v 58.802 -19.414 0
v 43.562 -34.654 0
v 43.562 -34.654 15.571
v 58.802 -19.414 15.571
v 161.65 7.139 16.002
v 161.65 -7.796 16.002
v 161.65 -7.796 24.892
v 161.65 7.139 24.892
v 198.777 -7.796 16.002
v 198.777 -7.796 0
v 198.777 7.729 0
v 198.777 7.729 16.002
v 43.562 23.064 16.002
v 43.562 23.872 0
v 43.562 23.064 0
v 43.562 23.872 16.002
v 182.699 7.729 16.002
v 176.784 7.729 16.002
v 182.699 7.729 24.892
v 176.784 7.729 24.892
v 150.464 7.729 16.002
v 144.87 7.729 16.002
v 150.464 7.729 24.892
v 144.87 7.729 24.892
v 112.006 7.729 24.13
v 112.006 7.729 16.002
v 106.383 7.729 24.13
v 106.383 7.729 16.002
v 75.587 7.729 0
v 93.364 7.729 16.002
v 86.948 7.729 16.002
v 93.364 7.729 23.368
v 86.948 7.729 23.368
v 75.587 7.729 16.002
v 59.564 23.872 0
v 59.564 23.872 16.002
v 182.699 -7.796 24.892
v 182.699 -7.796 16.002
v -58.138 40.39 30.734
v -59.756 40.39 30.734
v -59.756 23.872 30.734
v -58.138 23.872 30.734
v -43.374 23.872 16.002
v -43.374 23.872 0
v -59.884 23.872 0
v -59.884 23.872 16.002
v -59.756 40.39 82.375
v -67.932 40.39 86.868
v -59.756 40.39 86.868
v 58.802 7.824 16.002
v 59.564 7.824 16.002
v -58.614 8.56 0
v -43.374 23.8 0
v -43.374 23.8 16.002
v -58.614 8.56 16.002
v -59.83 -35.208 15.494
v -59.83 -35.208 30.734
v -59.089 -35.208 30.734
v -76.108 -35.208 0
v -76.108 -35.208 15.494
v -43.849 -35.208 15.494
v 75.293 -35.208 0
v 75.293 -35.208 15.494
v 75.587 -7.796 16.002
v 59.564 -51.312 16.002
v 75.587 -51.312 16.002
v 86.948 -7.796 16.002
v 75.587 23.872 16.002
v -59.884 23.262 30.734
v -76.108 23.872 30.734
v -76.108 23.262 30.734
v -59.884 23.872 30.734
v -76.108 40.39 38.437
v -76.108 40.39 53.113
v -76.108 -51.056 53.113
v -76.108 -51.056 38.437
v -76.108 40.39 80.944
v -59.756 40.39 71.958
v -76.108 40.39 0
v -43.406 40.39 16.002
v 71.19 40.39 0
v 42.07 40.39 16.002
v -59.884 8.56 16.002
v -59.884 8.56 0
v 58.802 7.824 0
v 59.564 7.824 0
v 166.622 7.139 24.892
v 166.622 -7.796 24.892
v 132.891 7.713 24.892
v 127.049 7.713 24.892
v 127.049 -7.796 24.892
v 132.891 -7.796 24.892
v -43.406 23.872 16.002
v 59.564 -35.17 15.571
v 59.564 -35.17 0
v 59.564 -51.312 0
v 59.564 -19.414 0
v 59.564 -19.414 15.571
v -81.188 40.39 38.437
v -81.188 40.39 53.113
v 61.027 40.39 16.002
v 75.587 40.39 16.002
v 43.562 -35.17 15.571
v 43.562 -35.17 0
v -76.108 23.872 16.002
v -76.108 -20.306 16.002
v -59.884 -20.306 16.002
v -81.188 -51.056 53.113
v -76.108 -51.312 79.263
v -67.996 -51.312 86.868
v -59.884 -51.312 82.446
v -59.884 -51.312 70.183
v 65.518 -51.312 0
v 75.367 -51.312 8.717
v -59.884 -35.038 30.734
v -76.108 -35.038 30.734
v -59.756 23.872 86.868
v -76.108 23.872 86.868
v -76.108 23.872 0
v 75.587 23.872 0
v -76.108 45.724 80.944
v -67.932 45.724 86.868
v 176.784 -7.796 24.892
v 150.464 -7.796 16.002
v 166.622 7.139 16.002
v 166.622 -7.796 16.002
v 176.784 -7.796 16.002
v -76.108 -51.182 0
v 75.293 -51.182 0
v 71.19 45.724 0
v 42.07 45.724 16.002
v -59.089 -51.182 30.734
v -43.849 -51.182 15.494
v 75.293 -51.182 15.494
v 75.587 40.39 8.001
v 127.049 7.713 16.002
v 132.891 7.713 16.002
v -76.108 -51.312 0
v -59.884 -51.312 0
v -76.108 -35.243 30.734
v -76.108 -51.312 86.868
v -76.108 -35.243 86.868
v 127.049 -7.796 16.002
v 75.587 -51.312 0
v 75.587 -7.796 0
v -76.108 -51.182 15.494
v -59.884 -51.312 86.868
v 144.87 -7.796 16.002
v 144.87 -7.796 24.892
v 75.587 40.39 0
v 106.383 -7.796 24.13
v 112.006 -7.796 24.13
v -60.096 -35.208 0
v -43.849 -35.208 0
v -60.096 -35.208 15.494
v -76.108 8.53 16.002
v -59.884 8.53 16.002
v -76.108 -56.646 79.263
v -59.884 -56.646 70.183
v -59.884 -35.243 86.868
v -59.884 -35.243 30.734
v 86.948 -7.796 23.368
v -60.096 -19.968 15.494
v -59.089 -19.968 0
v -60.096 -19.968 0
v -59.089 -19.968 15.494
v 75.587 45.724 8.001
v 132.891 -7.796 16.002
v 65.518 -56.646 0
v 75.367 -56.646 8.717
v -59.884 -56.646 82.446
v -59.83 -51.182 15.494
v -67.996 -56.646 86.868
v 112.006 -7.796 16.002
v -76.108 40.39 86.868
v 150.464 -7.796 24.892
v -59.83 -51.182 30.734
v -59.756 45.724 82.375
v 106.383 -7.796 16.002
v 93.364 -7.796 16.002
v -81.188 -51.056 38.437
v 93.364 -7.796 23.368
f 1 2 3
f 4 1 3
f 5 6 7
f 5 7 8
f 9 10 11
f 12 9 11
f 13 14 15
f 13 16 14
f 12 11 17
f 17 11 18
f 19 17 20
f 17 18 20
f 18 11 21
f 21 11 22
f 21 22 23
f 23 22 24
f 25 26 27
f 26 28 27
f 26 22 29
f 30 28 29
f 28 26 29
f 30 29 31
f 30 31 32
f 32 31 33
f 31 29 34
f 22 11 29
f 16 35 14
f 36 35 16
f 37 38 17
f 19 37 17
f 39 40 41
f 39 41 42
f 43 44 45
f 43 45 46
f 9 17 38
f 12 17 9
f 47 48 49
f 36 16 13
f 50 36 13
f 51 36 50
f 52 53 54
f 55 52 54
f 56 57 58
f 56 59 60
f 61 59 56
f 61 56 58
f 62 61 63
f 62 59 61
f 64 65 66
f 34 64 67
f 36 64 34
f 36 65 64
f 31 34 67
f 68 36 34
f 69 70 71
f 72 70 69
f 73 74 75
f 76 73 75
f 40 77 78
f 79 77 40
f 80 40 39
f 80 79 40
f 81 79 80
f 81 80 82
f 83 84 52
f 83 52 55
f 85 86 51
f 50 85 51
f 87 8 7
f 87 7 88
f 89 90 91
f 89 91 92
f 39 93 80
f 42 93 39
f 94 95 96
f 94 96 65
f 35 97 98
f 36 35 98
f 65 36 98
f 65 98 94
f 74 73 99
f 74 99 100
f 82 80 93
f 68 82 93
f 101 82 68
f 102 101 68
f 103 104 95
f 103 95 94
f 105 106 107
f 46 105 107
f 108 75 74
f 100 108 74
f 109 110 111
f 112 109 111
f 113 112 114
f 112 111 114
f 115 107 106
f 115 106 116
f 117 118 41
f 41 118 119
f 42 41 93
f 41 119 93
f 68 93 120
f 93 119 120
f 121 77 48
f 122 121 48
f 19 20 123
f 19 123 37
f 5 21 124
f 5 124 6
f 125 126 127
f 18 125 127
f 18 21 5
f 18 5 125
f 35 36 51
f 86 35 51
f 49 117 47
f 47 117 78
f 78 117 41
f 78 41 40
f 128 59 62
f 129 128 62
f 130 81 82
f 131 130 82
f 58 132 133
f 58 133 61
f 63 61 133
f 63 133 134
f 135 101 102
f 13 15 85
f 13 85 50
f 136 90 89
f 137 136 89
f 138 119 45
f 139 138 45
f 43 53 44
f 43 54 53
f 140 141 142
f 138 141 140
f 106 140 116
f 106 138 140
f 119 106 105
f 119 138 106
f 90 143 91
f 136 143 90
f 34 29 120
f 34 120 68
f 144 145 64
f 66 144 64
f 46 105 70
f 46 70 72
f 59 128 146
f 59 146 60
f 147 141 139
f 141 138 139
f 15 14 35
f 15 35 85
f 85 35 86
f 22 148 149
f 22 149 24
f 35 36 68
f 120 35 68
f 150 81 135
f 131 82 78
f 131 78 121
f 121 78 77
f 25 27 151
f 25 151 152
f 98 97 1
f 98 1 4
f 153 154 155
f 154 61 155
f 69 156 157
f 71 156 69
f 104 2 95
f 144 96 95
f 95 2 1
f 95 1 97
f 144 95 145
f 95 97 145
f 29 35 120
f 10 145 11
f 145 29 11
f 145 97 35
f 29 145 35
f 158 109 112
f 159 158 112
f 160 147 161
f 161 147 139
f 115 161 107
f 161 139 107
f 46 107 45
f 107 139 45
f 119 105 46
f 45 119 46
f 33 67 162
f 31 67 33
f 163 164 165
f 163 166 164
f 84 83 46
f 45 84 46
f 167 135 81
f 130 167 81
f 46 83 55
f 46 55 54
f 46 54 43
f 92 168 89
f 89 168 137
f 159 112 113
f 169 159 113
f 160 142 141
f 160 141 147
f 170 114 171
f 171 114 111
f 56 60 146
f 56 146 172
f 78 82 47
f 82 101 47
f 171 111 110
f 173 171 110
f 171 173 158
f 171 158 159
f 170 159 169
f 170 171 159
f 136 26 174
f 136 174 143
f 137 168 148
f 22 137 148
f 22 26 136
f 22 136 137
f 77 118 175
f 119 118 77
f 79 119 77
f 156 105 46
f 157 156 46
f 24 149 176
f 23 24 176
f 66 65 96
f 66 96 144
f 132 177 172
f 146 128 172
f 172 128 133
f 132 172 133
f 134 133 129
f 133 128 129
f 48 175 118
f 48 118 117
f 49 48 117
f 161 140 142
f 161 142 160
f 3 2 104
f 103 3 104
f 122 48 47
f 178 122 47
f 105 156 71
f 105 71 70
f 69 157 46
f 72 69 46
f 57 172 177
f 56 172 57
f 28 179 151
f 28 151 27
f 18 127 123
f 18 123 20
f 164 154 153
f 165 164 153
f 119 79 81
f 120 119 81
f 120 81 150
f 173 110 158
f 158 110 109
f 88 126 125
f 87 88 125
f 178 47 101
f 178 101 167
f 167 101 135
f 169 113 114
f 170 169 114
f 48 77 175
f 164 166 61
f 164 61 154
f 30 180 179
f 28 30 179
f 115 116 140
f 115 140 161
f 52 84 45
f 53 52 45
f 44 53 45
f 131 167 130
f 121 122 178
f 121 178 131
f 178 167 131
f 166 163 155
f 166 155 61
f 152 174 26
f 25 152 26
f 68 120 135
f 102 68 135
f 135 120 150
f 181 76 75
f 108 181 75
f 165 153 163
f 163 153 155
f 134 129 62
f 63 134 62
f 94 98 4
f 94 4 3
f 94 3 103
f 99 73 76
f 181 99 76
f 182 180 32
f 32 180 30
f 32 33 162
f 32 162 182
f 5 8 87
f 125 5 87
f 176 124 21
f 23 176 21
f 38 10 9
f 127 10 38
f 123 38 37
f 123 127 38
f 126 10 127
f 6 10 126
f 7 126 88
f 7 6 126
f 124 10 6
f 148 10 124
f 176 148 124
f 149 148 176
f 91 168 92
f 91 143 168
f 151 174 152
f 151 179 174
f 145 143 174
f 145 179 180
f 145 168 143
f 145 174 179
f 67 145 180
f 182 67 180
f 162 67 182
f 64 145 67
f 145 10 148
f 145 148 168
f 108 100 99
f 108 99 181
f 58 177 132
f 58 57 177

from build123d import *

# Parameters (mm, degrees)
F1_W         = 151.4005884528
F1_H         = 15.9740373492
F2_DEPTH     = 15.494
F3_W         = 151.6942754388
F3_H         = 16.5184233338
F4_DEPTH     = 16.002
F5_W         = 16.2231996655
F5_H         = 16.002
F6_DEPTH     = 75.184
F7_W         = 16.0225182772
F7_H         = 16.002
F8_DEPTH     = 75.184
F9_W         = 16.3512788713
F9_H         = 16.5184233338
F10_DEPTH    = 70.866
F11_W        = 16.2231996655
F11_H        = 16.0698437091
F12_DEPTH    = 70.866
F14_DEPTH    = 5.334
F16_DEPTH    = 5.334
F17_W        = 16.8584026396
F17_H        = 16.5184233338
F18_DEPTH    = 14.732
F19_W        = 74.9277304858
F19_H        = 14.6761201322
F19_W_2      = 16.5184233338
F20_DEPTH    = 5.08
F21_W        = 15.5249363743
F21_H        = 16.002
F22_DEPTH    = 123.19
F23_W        = 6.4162164927
F23_H        = 15.5249363743
F24_DEPTH    = 7.366
F25_W        = 5.6235641241
F25_H        = 15.5249363743
F27_DEPTH    = 8.128
F26_W        = 5.8422535658
F26_H        = 15.5089418404
F28_DEPTH    = 8.89
F29_W        = 5.5933743715
F29_H        = 15.5249363743
F31_DEPTH    = 8.89
F30_W        = 4.9718916416
F30_H        = 14.9346985854
F32_DEPTH    = 8.89
F33_W        = 5.9155483258
F33_H        = 15.5249363743
F34_DEPTH    = 8.89
F35_W        = 15.9818716347
F35_H        = 15.9740373492
F36_DEPTH    = 15.24
F37_SIZE     = 15.23999
F38_T4_DEPTH = 94.903320807
F39_W        = 16.2231996655
F39_H        = 15.4443886131
F40_DEPTH    = 14.732
F41_T4_DEPTH = 94.6080971387
F43_DEPTH    = 15.24
F44_SIZE     = 15.23999
F45_W        = 16.2231996655
F45_H        = 15.8491954207
F46_DEPTH    = 14.732
F47_T1_DEPTH = 94.6080971387
F48_W        = 15.3119927272
F48_H        = 16.002
F49_DEPTH    = 16.51
F50_SIZE     = 15.24
F51_W        = 16.0471685231
F51_H        = 16.002
F53_DEPTH    = 16.002
F52_W        = 15.7556738704
F52_H        = 15.5713185668
F54_DEPTH    = 16.002
F55_SIZE     = 15.24
F56_SIZE     = 15.24


# Not quite as in the source:
# - a fillet or chamfer that OpenCascade refuses, or shapes differently, is made with other operations: its cross-section is extruded or revolved along the edge and cut away or added
# - a fillet or chamfer is up to 0.001 mm smaller than in the source, because OpenCascade refuses the exact size


with BuildPart() as f2:
    # F1 (on face) → F2 (new body)
    with BuildSketch(Plane.XY):
        with Locations((-0.4072971642, -43.195284903)):
            Rectangle(F1_W, F1_H)
    extrude(amount=F2_DEPTH)

    # F35 (on face) → F36 (join)
    with BuildSketch(Plane.XY.offset(15.494)):
        with Locations((-51.8394764513, -43.195284903)):
            Rectangle(F35_W, F35_H)
    extrude(amount=F36_DEPTH)

    # F37 (size 15.24 in the source; OpenCascade refuses exactly that, so slightly less here)
    f37_edges = [f2.edges().sort_by_distance(p)[0] for p in [
        (-43.848541, -43.195285, 30.734),
    ]]
    chamfer(f37_edges, length=F37_SIZE)


with BuildPart() as f4:
    # F3 (on face) → F4 (new body)
    with BuildSketch(Plane.XY):
        with Locations((-0.2604536712, 32.1307359263)):
            Rectangle(F3_W, F3_H)
    extrude(amount=F4_DEPTH)

    # F9 (on face) → F10 (join)
    with BuildSketch(Plane.XY.offset(16.002)):
        with Locations((-67.931951955, 32.1307359263)):
            Rectangle(F9_W, F9_H)
    extrude(amount=F10_DEPTH)

    # F13 (on face) → F14 (join)
    with BuildSketch(Plane(origin=(0, 40.3899475932, 0), x_dir=(-1, 0, 0), z_dir=(0, 1, 0))):
        Polygon((59.7563125193, 71.958167232), (59.7563125193, 82.3752862081), (-61.0268224247, 16.002), (-42.0702156496, 16.002), align=None)
        Polygon((76.1075913906, 80.9435948159), (67.931951955, 86.868), (59.7563125193, 82.3752862081), (59.7563125193, 71.958167232), align=None)
        Polygon((-42.0702156496, 16.002), (-61.0268224247, 16.002), (-75.5866840482, 8.001), (-71.1899388967, 0), align=None)
    extrude(amount=F14_DEPTH)

    # F17 (on face) → F18 (join)
    with BuildSketch(Plane.XY.offset(16.002)):
        with Locations((-51.3271111995, 32.1307359263)):
            Rectangle(F17_W, F17_H)
    extrude(amount=F18_DEPTH)

    # F38: chamfer of 15.24 on 1 edges, made by hand


with BuildPart() as f6:
    # F5 (on face) → F6 (new body)
    with BuildSketch(Plane.XZ.offset(-23.8715242594)):
        with Locations((-67.9959915578, 8.001)):
            Rectangle(F5_W, F5_H)
    extrude(amount=F6_DEPTH)

    # F11 (on face) → F12 (join)
    with BuildSketch(Plane.XY.offset(16.002)):
        with Locations((-67.9959915578, -43.277553886)):
            Rectangle(F11_W, F11_H)
    extrude(amount=F12_DEPTH)

    # F39 (on face) → F40 (join)
    with BuildSketch(Plane.XY.offset(16.002)):
        with Locations((-67.9959915578, -27.5204377249)):
            Rectangle(F39_W, F39_H)
    extrude(amount=F40_DEPTH)

    # F41: chamfer of 15.24 on 1 edges, made by hand


with BuildPart() as f8:
    # F7 (on face) → F8 (new body)
    with BuildSketch(Plane.XZ.offset(-23.8715242594)):
        with Locations((67.5754249096, 8.001)):
            Rectangle(F7_W, F7_H)
    extrude(amount=F8_DEPTH)

    # F21 (on face) → F22 (join)
    with BuildSketch(Plane.YZ.offset(75.5866840482)):
        with Locations((-0.0333769713, 8.001)):
            Rectangle(F21_W, F21_H)
    extrude(amount=F22_DEPTH)

    # F23 (on face) → F24 (join)
    with BuildSketch(Plane.XY.offset(16.002)):
        with Locations((90.1563689113, -0.0333769713)):
            Rectangle(F23_W, F23_H)
    extrude(amount=F24_DEPTH)

    # F25 (on face) → F27 (join)
    with BuildSketch(Plane.XY.offset(16.002)):
        with Locations((109.1945394874, -0.0333769713)):
            Rectangle(F25_W, F25_H)
    extrude(amount=F27_DEPTH)

    # F26 (on face) → F28 (join)
    with BuildSketch(Plane.XY.offset(16.002)):
        with Locations((129.9700066447, -0.0413742382)):
            Rectangle(F26_W, F26_H)
    extrude(amount=F28_DEPTH)

    # F29 (on face) → F31 (join)
    with BuildSketch(Plane.XY.offset(16.002)):
        with Locations((147.6669237018, -0.0333769713)):
            Rectangle(F29_W, F29_H)
    extrude(amount=F31_DEPTH)

    # F30 (on face) → F32 (join)
    with BuildSketch(Plane.XY.offset(16.002)):
        with Locations((164.1362756491, -0.3284958657)):
            Rectangle(F30_W, F30_H)
    extrude(amount=F32_DEPTH)

    # F33 (on face) → F34 (join)
    with BuildSketch(Plane.XY.offset(16.002)):
        with Locations((179.7416785961, -0.0333769713)):
            Rectangle(F33_W, F33_H)
    extrude(amount=F34_DEPTH)

    # F52 (on face) → F54 (join)
    with BuildSketch(Plane(origin=(59.564165771, 0, 0), x_dir=(0, -1, 0), z_dir=(-1, 0, 0))):
        with Locations((27.2920625284, 7.7856592834)):
            Rectangle(F52_W, F52_H)
    extrude(amount=F54_DEPTH)

    # F56
    f56_edges = [f8.edges().sort_by_distance(p)[0] for p in [
        (43.562166, -19.414226, 7.785659),
    ]]
    chamfer(f56_edges, length=F56_SIZE)


with BuildPart() as f16:
    # F15 (on face) → F16 (new body)
    with BuildSketch(Plane.XZ.offset(51.3124757406)):
        Polygon((75.3667727113, 8.7171085179), (-59.8843917251, 82.4461491693), (-59.8843917251, 70.1829955211), (65.5179917812, 0), align=None)
        Polygon((-59.8843917251, 82.4461491693), (-67.9959915578, 86.868), (-76.1075913906, 79.2625099421), (-59.8843917251, 70.1829955211), align=None)
    extrude(amount=F16_DEPTH)


with BuildPart() as f20:
    # F19 (on face) → F20 (new body)
    with BuildSketch(Plane(origin=(-76.1075913906, 0, 0), x_dir=(0, -1, 0), z_dir=(-1, 0, 0))):
        with Locations((13.5923409835, 45.7748640329)):
            Rectangle(F19_W, F19_H)
        with Locations((-32.1307359263, 45.7748640329)):
            Rectangle(F19_W_2, F19_H)
    extrude(amount=F20_DEPTH)


with BuildPart() as f38_tool2:
    # F38_s3 → F38_t4 (new body)
    with BuildSketch(Plane.XZ.offset(15.3209244772)):
        Polygon((-42.8979098797, 15.494), (-58.1379098797, 30.734), (-42.8979098797, 30.734), align=None)
    extrude(amount=-F38_T4_DEPTH)

    split(bisect_by=Plane.XY.offset(16.002), keep=Keep.TOP)


with BuildPart() as f4_1:
    add(f4.part)

    # F38_t1: cut F38_tool2
    add(f38_tool2.part, mode=Mode.SUBTRACT)


with BuildPart() as f41_tool2:
    # F41_s3 → F41_t4 (new body)
    with BuildSketch(Plane.YZ.offset(-20.6919429885)):
        Polygon((-19.7982434183, 15.494), (-35.0382434183, 30.734), (-19.7982434183, 30.734), align=None)
    extrude(amount=-F41_T4_DEPTH)

    split(bisect_by=Plane.XY.offset(16.002), keep=Keep.TOP)


with BuildPart() as f6_1:
    add(f6.part)

    # F41_t1: cut F41_tool2
    add(f41_tool2.part, mode=Mode.SUBTRACT)


with BuildPart() as f43:
    # F42 (on face) → F43 (new body)
    with BuildSketch(Plane(origin=(0, -35.2082662284, 0), x_dir=(-1, 0, 0), z_dir=(0, 1, 0))):
        Polygon((43.8485406339, 0), (60.0956752896, 0), (60.0956752896, 15.494), (59.8304122686, 15.494), (43.8485406339, 15.494), align=None)
    extrude(amount=F43_DEPTH)

    # F44 (size 15.24 in the source; OpenCascade refuses exactly that, so slightly less here)
    f44_edges = [f43.edges().sort_by_distance(p)[0] for p in [
        (-43.848541, -19.968266, 7.747),
    ]]
    chamfer(f44_edges, length=F44_SIZE)


with BuildPart() as f46:
    # F45 (on face) → F46 (new body)
    with BuildSketch(Plane.XY.offset(16.002)):
        with Locations((-67.9959915578, 15.9469265491)):
            Rectangle(F45_W, F45_H)
    extrude(amount=F46_DEPTH)

    # F47: chamfer of 15.24 on 1 edges, made by hand

    # F47_s2 → F47_t1 (cut)
    with BuildSketch(Plane.YZ.offset(-115.3000401272)):
        Polygon((8.0223288387, 15.494), (23.2623288387, 30.734), (8.0223288387, 30.734), align=None)
    extrude(amount=F47_T1_DEPTH, mode=Mode.SUBTRACT)


with BuildPart() as f49:
    # F48 (on face) → F49 (new body)
    with BuildSketch(Plane.YZ.offset(-59.8843917251)):
        with Locations((16.2155278958, 8.001)):
            Rectangle(F48_W, F48_H)
    extrude(amount=F49_DEPTH)

    # F50
    f50_edges = [f49.edges().sort_by_distance(p)[0] for p in [
        (-43.374392, 8.559532, 8.001),
    ]]
    chamfer(f50_edges, length=F50_SIZE)


with BuildPart() as f53:
    # F51 (on face) → F53 (new body)
    with BuildSketch(Plane(origin=(59.564165771, 0, 0), x_dir=(0, -1, 0), z_dir=(-1, 0, 0))):
        with Locations((-15.8479399979, 8.001)):
            Rectangle(F51_W, F51_H)
    extrude(amount=F53_DEPTH)

    # F55
    f55_edges = [f53.edges().sort_by_distance(p)[0] for p in [
        (43.562166, 7.824356, 8.001),
    ]]
    chamfer(f55_edges, length=F55_SIZE)


solid = Compound([f2.part, f8.part, f16.part, f20.part, f4_1.part, f6_1.part, f43.part, f46.part, f49.part, f53.part])
